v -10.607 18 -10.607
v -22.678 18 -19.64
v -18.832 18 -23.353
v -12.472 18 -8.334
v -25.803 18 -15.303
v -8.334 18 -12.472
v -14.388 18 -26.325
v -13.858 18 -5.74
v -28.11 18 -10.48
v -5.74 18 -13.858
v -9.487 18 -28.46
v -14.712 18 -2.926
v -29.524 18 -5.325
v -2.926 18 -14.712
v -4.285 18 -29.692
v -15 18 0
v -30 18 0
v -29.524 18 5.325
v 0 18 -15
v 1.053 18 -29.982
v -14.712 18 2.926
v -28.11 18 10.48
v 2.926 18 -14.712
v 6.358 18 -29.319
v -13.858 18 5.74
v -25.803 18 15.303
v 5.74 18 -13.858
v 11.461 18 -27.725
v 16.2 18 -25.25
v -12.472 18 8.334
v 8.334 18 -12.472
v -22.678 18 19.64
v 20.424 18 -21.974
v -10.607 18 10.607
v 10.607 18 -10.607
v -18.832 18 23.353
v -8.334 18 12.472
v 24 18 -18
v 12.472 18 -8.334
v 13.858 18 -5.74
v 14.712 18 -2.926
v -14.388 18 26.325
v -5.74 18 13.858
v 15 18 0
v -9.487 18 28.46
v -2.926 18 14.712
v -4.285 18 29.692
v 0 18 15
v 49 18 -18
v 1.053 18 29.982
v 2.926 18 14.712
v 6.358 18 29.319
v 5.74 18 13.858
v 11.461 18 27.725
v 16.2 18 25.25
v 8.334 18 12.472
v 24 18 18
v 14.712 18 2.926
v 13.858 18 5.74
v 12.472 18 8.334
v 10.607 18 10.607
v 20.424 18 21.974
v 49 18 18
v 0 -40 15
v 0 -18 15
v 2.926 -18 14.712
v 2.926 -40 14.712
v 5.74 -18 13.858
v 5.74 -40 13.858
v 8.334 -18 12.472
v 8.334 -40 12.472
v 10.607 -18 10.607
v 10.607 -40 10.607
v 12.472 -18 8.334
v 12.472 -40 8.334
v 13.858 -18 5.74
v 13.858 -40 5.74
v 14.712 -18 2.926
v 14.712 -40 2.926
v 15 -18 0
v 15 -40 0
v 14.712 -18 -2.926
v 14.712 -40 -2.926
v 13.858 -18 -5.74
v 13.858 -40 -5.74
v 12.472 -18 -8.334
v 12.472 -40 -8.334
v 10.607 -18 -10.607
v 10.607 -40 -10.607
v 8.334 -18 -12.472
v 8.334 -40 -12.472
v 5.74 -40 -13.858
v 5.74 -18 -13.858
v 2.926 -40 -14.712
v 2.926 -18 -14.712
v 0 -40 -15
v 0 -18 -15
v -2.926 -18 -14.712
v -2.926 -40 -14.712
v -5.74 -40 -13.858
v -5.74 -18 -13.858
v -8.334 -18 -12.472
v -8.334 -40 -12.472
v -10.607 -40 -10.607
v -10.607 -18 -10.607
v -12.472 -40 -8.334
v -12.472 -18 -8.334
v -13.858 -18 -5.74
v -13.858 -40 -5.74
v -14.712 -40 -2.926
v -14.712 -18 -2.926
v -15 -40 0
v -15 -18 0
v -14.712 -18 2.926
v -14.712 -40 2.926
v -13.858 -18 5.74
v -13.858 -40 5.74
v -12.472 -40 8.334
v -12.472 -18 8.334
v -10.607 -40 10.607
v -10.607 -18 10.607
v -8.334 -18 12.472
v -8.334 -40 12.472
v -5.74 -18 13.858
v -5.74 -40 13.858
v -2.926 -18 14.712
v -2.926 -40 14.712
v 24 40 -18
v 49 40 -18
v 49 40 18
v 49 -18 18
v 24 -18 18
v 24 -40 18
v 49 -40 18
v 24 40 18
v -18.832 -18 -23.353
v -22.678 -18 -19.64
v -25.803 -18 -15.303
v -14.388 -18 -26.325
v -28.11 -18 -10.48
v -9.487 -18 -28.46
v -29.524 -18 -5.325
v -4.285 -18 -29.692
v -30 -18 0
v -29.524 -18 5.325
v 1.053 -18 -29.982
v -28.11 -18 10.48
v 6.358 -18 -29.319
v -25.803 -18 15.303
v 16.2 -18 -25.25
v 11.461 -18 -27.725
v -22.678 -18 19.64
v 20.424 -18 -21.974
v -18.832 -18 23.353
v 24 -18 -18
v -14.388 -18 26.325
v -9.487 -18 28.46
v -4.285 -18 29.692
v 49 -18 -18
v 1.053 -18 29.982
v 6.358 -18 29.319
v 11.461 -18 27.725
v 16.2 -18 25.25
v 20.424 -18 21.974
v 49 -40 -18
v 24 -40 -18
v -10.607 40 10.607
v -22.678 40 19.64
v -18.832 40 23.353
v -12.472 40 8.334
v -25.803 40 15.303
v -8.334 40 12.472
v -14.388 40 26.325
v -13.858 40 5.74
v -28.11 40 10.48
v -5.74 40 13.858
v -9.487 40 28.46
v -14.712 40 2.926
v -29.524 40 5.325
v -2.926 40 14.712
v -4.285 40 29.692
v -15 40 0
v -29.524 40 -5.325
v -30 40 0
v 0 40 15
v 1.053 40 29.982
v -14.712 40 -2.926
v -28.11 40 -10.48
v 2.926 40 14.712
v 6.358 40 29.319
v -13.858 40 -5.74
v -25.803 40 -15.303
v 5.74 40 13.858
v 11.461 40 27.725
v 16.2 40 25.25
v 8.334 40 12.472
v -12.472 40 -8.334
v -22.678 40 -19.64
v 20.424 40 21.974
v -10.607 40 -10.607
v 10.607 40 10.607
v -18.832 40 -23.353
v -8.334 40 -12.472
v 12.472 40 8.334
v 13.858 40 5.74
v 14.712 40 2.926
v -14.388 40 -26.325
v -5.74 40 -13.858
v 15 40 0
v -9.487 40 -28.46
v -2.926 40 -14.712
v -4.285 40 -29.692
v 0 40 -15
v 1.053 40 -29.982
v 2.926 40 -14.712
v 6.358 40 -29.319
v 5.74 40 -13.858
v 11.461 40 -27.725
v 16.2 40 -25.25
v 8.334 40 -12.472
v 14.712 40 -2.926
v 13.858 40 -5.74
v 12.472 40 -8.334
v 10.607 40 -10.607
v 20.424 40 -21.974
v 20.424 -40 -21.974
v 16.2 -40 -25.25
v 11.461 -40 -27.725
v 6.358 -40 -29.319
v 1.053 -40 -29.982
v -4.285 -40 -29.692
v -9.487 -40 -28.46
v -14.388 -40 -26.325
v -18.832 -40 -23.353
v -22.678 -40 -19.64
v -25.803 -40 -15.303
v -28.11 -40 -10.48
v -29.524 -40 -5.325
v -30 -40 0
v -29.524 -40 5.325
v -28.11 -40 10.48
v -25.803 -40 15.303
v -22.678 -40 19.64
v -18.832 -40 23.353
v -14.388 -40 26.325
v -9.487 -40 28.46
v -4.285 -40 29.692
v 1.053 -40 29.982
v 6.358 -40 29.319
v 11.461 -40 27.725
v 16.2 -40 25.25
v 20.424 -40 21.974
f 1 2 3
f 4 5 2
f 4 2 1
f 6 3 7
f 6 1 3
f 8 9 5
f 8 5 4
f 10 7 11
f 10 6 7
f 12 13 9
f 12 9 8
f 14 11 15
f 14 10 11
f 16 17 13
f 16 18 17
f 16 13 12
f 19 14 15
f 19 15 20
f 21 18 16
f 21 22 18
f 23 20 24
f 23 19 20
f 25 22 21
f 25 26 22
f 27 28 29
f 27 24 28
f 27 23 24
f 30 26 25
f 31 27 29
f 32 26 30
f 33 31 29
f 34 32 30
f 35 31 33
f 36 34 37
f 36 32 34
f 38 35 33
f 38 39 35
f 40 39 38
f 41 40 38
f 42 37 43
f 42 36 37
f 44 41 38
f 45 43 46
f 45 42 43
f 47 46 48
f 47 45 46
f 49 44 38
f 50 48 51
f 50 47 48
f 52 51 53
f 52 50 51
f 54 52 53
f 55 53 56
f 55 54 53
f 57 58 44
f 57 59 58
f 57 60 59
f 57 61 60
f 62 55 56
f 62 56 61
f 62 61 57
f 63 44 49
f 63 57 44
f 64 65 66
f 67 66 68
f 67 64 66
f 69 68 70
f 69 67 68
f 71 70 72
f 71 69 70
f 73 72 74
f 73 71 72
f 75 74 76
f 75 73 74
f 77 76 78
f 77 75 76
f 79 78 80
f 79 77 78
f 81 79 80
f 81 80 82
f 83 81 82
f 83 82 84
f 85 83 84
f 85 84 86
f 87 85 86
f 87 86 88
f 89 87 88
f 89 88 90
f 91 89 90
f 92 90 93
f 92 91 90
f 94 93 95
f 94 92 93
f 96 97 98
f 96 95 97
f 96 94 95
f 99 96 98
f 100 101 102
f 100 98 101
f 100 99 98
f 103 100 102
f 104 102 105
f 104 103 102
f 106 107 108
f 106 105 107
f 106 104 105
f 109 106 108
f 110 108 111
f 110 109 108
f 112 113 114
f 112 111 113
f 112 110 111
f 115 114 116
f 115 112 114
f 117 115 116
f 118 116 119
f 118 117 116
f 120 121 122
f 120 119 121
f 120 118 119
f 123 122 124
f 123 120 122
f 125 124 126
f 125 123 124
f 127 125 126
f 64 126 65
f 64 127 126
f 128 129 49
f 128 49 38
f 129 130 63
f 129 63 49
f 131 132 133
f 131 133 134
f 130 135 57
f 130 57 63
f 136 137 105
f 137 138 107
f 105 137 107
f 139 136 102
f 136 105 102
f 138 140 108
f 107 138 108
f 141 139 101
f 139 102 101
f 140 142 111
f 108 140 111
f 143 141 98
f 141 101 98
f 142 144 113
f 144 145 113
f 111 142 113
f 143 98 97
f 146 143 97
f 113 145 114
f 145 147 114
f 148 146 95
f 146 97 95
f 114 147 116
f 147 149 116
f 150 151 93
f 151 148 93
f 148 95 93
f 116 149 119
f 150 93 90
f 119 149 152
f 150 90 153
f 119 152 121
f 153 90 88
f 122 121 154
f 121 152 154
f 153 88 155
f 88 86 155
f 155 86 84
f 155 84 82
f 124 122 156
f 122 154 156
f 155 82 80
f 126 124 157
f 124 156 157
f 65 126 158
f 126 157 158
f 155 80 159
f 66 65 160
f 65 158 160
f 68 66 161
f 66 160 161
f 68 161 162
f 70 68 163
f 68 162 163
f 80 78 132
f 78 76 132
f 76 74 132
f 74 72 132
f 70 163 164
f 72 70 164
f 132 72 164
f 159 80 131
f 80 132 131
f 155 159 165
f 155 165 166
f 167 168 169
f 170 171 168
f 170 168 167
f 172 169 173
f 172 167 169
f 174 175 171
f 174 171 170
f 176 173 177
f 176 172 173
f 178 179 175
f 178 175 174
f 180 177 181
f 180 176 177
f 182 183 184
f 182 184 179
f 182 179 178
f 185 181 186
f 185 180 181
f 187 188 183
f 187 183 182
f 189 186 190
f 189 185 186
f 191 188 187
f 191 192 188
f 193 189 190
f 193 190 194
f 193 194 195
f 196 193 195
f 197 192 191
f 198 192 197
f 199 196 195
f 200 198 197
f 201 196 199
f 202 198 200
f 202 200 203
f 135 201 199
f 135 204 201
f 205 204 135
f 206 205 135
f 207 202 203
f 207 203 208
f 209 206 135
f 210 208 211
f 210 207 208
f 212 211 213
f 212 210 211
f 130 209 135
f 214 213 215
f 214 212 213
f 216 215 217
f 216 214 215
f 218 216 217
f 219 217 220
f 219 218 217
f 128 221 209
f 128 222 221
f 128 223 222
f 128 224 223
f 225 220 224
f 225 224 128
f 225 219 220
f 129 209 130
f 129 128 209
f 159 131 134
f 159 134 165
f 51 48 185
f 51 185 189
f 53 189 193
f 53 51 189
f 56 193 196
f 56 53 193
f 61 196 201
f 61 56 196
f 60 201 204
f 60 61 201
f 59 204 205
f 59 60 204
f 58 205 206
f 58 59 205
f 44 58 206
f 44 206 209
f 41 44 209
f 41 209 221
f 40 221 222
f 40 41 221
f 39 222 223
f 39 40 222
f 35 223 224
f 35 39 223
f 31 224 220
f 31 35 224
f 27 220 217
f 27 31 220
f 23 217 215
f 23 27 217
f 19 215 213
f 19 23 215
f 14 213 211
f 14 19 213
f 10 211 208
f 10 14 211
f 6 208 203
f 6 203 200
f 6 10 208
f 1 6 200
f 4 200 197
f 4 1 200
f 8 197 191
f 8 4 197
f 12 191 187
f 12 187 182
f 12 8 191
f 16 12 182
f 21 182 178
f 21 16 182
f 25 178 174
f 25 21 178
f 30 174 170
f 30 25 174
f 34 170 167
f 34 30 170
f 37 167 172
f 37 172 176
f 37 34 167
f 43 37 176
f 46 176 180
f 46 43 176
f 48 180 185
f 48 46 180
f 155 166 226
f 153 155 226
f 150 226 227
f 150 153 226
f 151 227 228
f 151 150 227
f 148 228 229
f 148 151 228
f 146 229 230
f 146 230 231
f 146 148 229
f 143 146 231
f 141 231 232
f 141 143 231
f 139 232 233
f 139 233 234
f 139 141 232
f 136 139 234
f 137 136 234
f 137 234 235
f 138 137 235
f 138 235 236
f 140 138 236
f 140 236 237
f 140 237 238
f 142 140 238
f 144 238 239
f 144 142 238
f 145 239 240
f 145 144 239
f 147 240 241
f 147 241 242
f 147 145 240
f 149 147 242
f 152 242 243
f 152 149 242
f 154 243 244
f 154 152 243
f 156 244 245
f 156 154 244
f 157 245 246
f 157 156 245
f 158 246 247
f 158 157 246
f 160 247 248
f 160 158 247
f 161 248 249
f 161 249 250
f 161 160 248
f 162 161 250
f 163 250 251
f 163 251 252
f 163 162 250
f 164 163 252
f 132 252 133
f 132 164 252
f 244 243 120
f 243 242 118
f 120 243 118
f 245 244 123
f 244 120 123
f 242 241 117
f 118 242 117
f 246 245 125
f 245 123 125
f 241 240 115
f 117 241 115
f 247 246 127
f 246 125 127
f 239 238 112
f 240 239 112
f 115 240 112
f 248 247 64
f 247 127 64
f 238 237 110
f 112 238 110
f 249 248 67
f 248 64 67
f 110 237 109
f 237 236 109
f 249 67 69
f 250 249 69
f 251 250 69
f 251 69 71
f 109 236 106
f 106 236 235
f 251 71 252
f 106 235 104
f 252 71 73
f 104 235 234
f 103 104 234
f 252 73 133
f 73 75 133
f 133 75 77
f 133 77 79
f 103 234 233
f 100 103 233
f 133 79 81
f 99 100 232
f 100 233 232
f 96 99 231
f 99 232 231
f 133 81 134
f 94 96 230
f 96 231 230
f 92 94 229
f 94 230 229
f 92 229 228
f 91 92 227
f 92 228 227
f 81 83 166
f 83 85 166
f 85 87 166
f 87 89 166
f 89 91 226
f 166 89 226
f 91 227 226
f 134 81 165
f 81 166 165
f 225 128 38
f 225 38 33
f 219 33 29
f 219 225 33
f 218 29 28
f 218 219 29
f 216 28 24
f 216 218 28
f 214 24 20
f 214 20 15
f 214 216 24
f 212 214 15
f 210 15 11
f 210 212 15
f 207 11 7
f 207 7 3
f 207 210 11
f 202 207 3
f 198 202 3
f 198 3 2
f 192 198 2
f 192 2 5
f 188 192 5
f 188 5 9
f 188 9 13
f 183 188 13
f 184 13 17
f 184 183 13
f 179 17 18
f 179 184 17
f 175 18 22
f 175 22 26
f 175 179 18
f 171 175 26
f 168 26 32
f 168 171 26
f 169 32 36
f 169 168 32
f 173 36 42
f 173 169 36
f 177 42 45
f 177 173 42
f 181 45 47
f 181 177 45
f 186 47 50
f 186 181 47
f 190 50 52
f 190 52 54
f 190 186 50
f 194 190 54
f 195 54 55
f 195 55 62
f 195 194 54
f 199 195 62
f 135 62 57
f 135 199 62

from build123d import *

# Parameters (mm, degrees)
CROQUIS3_R              = 15
SALIENTE_EXTRUIR3_DEPTH = 40
CROQUIS6_W              = 91.129860116
CROQUIS6_H              = 36
CORTAR_EXTRUIR2_DEPTH   = 40


with BuildPart() as part:
    # Croquis3 → Saliente-Extruir3 (new, symmetric)
    with BuildSketch(Plane(origin=(0, 0, 0), x_dir=(1, 0, 0), z_dir=(0, 1, 0))):
        with BuildLine():
            Line((24, -18), (49, -18))
            Line((49, -18), (49, 18))
            Line((49, 18), (24, 18))
            ThreePointArc((24, 18), (-30, 0), (24, -18))
        make_face()
        with Locations(Location((0, 0, 0), (0, 0, 270))):
            Circle(CROQUIS3_R, mode=Mode.SUBTRACT)
    extrude(amount=SALIENTE_EXTRUIR3_DEPTH, both=True)

    # Croquis6 → Cortar-Extruir2 (cut, symmetric)
    with BuildSketch(Plane.XY):
        with Locations((11.421412713, 0)):
            Rectangle(CROQUIS6_W, CROQUIS6_H)
    extrude(amount=CORTAR_EXTRUIR2_DEPTH, both=True, mode=Mode.SUBTRACT)


with BuildPart() as cortar_extruir2_piece_1:
    # of the separate pieces the step leaves, piece 1, a body of its own (cortar_extruir2_pieces)
    add(part.part.solids().sort_by_distance((24, -18, 18))[0])


with BuildPart() as cortar_extruir2_piece_2:
    # of the separate pieces the step leaves, piece 2, a body of its own (cortar_extruir2_pieces)
    add(part.part.solids().sort_by_distance((24, 40, 18))[0])


solid = Compound([cortar_extruir2_piece_1.part, cortar_extruir2_piece_2.part])
